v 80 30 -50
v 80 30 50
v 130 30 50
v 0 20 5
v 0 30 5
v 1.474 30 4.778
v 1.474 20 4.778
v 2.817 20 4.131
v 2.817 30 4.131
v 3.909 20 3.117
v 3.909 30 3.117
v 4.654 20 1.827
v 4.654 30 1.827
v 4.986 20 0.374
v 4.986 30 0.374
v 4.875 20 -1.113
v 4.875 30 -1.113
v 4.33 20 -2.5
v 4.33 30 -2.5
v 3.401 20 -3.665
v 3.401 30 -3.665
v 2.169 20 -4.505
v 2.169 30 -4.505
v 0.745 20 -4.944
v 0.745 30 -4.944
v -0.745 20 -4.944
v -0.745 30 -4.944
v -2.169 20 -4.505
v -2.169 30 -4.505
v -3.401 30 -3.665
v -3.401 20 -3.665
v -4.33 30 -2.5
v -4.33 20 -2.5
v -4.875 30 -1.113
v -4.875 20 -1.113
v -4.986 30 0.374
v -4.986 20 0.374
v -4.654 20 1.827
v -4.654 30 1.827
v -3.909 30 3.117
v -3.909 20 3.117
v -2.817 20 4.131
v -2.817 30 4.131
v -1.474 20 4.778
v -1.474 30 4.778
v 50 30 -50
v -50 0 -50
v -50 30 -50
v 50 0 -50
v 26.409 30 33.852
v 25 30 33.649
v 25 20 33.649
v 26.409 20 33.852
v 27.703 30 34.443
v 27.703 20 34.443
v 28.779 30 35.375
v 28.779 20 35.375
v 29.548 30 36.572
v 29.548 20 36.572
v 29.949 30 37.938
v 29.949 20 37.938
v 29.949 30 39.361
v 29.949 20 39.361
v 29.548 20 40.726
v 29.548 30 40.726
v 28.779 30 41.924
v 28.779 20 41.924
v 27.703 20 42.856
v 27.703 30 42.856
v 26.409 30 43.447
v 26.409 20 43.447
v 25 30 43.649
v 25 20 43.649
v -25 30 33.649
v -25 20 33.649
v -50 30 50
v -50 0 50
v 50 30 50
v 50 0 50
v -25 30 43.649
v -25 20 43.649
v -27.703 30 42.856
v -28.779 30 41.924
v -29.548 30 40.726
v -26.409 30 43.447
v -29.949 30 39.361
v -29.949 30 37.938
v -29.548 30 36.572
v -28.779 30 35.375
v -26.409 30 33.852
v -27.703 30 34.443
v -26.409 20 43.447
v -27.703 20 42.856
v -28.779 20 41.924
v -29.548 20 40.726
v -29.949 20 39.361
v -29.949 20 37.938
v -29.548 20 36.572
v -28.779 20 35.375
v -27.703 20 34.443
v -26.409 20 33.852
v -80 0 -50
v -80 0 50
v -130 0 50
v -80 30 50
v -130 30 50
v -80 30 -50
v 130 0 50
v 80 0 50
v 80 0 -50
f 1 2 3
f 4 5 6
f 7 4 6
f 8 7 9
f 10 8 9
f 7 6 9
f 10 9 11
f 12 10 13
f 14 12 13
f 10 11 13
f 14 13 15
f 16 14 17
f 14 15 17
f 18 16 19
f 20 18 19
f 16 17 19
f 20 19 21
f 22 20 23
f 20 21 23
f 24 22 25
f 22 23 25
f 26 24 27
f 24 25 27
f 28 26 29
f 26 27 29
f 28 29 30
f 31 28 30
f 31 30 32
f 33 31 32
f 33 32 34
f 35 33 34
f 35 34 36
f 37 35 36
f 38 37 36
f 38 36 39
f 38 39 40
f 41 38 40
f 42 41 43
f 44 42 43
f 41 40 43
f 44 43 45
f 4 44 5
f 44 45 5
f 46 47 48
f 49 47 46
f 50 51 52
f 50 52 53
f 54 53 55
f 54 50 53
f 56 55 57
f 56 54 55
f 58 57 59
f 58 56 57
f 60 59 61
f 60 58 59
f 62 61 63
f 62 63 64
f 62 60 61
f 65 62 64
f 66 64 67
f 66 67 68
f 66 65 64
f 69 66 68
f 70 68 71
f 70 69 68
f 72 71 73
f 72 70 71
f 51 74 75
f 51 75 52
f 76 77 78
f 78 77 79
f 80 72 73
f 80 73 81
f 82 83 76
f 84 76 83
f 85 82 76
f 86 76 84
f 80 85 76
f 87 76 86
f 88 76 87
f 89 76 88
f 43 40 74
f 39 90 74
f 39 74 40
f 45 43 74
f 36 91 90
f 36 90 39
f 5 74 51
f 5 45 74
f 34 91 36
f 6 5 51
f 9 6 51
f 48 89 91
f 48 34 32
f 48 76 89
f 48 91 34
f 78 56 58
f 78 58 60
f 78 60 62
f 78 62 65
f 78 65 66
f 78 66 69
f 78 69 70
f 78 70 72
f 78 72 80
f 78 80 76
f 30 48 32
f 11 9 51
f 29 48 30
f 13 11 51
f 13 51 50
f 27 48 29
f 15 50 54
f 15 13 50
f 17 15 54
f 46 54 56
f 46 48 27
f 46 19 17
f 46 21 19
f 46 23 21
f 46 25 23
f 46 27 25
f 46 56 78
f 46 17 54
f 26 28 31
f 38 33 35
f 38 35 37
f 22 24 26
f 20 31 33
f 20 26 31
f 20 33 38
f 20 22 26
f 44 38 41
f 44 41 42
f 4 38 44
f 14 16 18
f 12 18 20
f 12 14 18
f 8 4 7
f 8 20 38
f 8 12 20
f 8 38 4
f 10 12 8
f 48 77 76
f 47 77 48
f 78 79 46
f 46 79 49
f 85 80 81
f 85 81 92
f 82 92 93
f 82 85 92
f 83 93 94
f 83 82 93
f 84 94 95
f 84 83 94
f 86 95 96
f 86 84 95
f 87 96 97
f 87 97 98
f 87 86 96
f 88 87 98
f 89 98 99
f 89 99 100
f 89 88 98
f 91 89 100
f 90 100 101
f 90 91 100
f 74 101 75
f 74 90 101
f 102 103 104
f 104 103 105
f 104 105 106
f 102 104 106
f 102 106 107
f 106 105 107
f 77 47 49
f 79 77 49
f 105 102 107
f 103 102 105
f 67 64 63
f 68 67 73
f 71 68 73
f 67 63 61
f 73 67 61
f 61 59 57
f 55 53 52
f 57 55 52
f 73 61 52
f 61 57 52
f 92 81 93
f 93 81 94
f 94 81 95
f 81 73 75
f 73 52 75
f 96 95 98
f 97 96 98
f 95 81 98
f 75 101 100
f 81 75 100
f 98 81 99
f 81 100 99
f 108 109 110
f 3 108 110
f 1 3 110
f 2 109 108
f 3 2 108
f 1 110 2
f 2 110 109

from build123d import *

# Parameters (mm, degrees)
EXTRUDE_1_DEPTH     = 30
SKETCH_1_W          = 100
SKETCH_1_H          = 100
EXTRUDE_1_2_DEPTH   = 30
SKETCH_2_R          = 5
CUT_EXTRUDE_1_DEPTH = 10


with BuildPart() as part:
    # 草图1 → 凸台-拉伸1 (new body)
    with BuildSketch(Plane(origin=(0, 0, 0), x_dir=(1, 0, 0), z_dir=(0, 1, 0))):
        Polygon((80, -50), (130, -50), (80, 50), align=None)
    extrude(amount=EXTRUDE_1_DEPTH)


with BuildPart() as body_2:
    # 草图1 → Extrude 1 2 (new body)
    with BuildSketch(Plane(origin=(0, 0, 0), x_dir=(1, 0, 0), z_dir=(0, 1, 0))):
        Rectangle(SKETCH_1_W, SKETCH_1_H)
    extrude(amount=EXTRUDE_1_2_DEPTH)

    # 草图2 → 切除-拉伸1 (cut)
    with BuildSketch(Plane(origin=(0, 30, 0), x_dir=(1, 0, 0), z_dir=(0, 1, 0))):
        with Locations(Location((0, 0, 0), (0, 0, 270))):
            Circle(SKETCH_2_R)
        with BuildLine():
            Line((-25, -33.649292644), (25, -33.649292644))
            ThreePointArc((25, -33.649292644), (30, -38.649292644), (25, -43.649292644))
            Line((25, -43.649292644), (-25, -43.649292644))
            ThreePointArc((-25, -43.649292644), (-30, -38.649292644), (-25, -33.649292644))
        make_face()
    extrude(amount=-CUT_EXTRUDE_1_DEPTH, mode=Mode.SUBTRACT)


with BuildPart() as body_3:
    # 镜向1: mirrored copy
    add(part.part.mirror(Plane(origin=(0, 0, 0), x_dir=(0, 0, 1), z_dir=(1, 0, 0))))


solid = Compound([part.part, body_2.part, body_3.part])
